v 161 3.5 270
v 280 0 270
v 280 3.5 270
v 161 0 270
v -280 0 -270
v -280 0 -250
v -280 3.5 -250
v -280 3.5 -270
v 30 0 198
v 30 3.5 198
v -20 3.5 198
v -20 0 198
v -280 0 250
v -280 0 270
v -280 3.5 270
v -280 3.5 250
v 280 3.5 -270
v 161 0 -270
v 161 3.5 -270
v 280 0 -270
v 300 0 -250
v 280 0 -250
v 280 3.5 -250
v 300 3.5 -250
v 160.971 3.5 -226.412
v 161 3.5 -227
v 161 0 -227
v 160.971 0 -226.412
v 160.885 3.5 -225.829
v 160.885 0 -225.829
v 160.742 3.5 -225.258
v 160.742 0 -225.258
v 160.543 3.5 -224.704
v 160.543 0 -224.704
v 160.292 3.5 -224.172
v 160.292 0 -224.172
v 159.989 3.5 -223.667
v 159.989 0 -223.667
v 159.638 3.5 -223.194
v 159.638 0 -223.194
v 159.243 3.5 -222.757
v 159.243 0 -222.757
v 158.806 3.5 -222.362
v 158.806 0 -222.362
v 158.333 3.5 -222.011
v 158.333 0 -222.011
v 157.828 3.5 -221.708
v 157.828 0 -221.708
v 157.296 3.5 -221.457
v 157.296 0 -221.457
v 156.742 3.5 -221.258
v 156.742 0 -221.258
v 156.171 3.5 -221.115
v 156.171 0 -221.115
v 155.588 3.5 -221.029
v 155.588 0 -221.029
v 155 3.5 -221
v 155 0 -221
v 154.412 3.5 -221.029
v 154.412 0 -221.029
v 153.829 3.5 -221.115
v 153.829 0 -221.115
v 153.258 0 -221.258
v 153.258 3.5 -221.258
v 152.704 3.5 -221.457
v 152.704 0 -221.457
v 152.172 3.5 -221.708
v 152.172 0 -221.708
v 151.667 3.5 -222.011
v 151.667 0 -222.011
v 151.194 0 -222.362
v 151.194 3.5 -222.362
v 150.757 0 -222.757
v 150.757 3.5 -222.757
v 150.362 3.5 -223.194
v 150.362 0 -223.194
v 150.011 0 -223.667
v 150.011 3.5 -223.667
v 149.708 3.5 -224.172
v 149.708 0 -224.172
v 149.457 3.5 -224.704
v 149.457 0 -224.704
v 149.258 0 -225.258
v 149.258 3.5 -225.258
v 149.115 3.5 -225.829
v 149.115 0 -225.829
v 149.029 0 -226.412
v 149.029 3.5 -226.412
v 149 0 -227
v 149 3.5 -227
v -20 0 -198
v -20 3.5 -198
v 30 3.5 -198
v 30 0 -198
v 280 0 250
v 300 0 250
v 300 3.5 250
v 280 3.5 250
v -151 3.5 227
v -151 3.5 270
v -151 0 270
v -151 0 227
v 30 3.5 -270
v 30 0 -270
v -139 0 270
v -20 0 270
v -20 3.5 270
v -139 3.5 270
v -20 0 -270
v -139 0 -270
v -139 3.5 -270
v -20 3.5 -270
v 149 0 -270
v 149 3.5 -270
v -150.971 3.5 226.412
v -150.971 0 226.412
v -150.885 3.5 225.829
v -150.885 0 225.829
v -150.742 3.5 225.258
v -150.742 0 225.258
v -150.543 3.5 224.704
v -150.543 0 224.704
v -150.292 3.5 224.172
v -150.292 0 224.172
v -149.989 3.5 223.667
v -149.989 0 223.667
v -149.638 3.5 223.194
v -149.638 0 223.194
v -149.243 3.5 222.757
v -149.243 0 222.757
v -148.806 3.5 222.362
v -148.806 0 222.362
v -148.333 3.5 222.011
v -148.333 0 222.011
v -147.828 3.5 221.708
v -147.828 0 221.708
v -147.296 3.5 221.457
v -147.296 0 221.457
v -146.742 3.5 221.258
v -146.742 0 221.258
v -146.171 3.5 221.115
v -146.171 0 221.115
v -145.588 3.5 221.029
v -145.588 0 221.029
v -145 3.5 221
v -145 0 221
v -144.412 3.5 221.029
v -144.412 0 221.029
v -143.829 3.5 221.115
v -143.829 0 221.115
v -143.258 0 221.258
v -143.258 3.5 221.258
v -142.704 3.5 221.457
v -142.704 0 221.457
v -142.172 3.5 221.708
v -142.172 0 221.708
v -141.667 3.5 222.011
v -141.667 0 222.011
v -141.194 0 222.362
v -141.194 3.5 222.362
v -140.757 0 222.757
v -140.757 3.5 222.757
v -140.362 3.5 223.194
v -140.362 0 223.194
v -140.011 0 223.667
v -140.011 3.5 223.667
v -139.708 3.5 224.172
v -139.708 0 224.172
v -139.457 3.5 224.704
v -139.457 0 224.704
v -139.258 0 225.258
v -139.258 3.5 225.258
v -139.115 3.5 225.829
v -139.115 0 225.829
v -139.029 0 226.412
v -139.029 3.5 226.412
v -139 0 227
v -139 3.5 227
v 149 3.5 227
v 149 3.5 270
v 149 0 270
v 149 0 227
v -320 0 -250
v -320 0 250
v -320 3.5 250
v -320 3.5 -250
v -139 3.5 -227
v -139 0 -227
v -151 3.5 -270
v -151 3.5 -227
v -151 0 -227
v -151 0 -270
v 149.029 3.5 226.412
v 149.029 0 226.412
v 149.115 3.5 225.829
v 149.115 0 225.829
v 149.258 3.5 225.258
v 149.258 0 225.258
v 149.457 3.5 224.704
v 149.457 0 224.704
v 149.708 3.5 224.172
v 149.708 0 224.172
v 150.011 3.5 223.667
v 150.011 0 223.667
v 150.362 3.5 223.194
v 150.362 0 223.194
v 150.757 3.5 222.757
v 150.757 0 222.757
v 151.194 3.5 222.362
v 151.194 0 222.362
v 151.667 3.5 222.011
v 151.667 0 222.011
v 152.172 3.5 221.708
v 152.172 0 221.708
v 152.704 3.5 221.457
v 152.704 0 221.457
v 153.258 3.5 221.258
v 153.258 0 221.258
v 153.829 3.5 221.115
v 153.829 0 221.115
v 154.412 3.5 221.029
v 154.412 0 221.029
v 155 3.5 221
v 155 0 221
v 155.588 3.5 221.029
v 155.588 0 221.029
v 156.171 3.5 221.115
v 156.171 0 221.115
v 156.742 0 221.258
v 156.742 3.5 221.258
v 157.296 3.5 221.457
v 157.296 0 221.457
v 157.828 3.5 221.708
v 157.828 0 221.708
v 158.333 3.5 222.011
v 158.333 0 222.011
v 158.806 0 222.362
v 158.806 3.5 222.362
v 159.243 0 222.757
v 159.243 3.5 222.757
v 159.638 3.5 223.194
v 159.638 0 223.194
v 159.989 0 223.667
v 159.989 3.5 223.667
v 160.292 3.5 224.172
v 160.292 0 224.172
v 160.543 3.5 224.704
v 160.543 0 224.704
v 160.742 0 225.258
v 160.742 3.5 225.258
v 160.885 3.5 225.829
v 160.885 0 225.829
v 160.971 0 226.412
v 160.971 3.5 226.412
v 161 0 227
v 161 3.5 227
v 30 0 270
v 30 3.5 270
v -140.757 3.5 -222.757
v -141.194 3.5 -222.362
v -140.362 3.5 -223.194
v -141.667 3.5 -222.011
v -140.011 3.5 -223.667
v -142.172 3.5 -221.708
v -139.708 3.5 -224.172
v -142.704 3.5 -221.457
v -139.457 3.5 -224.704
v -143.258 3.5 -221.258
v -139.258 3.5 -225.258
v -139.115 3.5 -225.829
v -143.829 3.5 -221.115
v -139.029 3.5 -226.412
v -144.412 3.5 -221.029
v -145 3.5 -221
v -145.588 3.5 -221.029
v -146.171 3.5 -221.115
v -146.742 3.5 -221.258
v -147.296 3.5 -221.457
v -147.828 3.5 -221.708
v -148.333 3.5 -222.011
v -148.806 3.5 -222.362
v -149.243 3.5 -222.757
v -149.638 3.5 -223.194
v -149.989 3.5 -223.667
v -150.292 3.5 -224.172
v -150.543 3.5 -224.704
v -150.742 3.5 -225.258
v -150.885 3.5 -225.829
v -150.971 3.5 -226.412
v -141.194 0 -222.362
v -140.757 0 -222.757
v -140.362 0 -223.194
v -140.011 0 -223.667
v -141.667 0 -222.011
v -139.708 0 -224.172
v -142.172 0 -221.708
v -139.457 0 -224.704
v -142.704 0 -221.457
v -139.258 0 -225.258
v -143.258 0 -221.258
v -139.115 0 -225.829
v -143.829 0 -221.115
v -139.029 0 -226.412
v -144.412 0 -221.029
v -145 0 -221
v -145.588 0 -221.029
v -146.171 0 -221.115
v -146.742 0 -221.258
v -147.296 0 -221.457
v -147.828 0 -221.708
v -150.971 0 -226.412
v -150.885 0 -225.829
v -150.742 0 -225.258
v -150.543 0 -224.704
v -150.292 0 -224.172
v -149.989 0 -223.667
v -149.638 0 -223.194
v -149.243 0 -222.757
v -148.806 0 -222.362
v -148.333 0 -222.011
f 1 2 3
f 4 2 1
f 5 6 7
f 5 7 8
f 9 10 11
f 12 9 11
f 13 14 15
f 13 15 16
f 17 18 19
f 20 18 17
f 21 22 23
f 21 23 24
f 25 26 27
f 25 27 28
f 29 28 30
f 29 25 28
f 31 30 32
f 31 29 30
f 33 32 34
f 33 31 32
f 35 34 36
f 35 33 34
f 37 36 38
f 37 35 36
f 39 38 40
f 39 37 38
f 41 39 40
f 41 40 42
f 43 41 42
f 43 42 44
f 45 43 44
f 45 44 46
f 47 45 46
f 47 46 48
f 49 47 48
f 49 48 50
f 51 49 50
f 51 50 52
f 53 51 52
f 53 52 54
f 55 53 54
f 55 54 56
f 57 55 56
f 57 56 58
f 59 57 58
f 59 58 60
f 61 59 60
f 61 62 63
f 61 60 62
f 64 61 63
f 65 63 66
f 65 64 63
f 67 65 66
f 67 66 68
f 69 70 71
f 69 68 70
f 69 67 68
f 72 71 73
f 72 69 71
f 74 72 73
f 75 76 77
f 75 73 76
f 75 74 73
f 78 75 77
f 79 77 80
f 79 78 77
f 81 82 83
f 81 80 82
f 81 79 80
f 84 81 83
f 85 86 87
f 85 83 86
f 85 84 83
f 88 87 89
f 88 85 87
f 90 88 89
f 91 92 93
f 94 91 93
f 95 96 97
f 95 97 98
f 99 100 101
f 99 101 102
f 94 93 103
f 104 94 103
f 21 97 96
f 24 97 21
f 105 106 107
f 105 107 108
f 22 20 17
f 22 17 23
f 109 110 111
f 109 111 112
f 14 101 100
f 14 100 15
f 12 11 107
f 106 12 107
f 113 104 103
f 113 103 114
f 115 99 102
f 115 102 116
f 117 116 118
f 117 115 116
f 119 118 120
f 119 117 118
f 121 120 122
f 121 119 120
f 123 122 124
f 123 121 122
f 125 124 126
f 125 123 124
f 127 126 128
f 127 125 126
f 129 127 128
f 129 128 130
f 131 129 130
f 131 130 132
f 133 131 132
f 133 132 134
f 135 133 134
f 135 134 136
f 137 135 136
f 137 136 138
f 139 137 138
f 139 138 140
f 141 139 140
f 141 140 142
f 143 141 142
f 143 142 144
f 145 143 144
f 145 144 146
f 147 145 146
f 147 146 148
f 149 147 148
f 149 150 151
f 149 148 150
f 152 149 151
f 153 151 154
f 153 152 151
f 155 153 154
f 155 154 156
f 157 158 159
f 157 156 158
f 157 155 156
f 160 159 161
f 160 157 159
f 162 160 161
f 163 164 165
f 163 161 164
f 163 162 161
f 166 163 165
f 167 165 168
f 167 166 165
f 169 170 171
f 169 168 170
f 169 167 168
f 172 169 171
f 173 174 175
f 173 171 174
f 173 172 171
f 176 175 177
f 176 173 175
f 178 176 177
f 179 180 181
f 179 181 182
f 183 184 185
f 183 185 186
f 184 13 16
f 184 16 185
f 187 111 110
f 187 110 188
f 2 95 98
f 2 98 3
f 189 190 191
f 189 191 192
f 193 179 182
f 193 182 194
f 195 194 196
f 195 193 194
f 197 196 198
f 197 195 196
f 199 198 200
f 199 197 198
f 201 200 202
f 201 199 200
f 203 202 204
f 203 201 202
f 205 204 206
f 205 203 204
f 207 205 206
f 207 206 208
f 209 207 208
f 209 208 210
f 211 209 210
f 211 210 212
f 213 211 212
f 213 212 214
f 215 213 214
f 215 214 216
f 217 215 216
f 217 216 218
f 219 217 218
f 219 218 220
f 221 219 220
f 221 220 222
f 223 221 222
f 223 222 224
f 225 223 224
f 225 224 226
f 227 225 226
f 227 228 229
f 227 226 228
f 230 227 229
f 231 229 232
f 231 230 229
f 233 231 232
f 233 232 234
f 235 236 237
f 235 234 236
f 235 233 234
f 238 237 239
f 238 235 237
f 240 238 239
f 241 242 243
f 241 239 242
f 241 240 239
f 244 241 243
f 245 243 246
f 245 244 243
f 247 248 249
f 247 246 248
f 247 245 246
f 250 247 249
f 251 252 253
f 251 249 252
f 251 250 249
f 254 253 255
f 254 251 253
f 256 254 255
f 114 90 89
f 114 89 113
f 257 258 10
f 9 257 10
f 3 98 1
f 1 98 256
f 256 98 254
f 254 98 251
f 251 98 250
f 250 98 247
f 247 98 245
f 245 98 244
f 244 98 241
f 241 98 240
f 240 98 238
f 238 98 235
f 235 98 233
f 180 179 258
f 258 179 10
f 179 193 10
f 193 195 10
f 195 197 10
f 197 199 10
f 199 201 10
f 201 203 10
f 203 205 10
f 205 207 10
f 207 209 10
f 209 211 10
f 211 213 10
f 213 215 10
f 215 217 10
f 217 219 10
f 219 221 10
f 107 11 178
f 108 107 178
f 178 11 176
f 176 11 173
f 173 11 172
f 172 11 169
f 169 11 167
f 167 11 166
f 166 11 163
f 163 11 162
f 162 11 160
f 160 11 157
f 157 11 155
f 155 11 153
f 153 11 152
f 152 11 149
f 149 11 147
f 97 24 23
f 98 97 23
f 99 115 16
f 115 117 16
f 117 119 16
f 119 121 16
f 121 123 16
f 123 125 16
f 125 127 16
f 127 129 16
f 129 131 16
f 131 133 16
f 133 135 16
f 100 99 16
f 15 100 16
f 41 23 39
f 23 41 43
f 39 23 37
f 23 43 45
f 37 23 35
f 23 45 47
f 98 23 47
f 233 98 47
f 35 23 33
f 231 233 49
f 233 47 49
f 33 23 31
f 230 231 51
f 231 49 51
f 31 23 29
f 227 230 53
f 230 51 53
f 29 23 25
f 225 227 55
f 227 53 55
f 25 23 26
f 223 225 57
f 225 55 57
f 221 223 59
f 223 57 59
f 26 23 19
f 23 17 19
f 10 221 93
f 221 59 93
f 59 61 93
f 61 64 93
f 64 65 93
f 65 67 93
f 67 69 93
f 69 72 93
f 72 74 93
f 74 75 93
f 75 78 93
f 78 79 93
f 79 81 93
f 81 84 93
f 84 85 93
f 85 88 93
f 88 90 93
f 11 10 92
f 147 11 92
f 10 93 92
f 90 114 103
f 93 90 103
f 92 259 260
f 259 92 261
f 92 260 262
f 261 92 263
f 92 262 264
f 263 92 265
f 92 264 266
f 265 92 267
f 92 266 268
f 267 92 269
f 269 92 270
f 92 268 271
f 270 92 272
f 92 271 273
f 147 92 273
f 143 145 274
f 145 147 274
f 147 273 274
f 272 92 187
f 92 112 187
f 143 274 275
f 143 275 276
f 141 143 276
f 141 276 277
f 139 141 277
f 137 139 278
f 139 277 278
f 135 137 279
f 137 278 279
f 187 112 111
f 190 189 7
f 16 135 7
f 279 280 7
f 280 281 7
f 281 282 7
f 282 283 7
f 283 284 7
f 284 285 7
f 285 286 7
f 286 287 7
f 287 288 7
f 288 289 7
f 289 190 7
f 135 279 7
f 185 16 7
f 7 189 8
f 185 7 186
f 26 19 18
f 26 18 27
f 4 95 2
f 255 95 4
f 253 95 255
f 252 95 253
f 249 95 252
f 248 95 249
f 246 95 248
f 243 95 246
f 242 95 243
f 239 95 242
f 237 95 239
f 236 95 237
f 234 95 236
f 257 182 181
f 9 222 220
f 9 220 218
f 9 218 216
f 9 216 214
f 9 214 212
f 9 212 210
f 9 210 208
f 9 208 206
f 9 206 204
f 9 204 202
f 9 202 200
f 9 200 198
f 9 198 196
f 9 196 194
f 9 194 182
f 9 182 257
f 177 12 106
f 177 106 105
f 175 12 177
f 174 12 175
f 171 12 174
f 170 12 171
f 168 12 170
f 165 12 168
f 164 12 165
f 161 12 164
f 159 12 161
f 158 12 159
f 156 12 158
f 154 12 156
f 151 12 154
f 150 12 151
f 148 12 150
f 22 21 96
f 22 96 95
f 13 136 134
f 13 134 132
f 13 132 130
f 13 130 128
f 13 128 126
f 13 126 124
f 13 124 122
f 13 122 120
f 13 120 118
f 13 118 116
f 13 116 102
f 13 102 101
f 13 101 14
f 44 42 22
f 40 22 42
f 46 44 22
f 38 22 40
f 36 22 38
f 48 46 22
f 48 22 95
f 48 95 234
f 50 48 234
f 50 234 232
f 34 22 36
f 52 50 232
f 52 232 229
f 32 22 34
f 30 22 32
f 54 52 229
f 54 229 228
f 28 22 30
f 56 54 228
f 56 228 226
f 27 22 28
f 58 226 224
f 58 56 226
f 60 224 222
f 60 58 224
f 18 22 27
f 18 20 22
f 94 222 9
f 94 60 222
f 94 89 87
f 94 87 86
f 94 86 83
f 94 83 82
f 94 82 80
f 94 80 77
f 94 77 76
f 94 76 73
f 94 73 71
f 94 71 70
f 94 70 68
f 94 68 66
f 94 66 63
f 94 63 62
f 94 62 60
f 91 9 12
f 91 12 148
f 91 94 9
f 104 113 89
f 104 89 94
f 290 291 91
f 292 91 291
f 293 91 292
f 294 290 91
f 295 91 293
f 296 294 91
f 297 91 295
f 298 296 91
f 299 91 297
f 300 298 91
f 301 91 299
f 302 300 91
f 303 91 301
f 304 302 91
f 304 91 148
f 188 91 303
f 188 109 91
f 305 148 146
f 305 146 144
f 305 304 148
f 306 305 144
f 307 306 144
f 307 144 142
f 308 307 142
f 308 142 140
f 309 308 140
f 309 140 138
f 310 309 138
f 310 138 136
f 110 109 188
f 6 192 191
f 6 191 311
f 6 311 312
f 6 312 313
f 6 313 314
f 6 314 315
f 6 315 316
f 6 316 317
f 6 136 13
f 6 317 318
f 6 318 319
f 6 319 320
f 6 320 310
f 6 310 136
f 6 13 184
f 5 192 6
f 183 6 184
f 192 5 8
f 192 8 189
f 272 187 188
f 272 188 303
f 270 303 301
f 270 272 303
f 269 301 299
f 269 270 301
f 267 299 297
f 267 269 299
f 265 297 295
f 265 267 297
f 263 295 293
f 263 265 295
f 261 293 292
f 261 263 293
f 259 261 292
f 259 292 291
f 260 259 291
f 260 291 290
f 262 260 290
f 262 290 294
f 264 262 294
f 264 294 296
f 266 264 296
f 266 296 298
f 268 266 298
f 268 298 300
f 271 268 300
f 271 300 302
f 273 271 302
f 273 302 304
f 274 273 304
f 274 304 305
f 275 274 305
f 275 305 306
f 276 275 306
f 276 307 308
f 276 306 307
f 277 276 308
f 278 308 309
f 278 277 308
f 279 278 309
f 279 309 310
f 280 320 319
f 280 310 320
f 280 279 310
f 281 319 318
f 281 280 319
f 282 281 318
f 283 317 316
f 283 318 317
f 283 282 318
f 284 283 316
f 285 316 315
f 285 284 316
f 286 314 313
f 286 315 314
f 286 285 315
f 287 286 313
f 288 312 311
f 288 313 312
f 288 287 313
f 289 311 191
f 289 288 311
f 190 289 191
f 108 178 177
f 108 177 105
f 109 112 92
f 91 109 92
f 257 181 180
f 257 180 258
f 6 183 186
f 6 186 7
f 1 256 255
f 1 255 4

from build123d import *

# Parameters (mm, degrees)
BOSS_EXTRUDE1_DEPTH = 3.5
SKETCH2_W           = 20
SKETCH2_H           = 40
CUT_EXTRUDE1_DEPTH  = 10
CUT_EXTRUDE2_DEPTH  = 10
SKETCH4_W           = 20
SKETCH4_H           = 420
CUT_EXTRUDE3_DEPTH  = 4.5


with BuildPart() as part:
    # Sketch1 → Boss-Extrude1 (new body)
    with BuildSketch(Plane(origin=(0, 0, 0), x_dir=(1, 0, 0), z_dir=(0, 1, 0))):
        Polygon((-280, 270), (280, 270), (280, 250), (320, 250), (320, -250), (280, -250), (280, -270), (-280, -270), (-280, -250), (-320, -250), (-320, 250), (-280, 250), align=None)
    extrude(amount=BOSS_EXTRUDE1_DEPTH)

    # Sketch2 → Cut-Extrude1 (cut)
    with BuildSketch(Plane(origin=(0, 3.5, 0), x_dir=(1, 0, 0), z_dir=(0, 1, 0))):
        Polygon((30, -250), (30, -198), (-20, -198), (-20, -250), (-20, -270), (30, -270), align=None)
        Polygon((-20, 198), (30, 198), (30, 250), (30, 270), (-20, 270), (-20, 250), align=None)
        with Locations((310, 230)):
            Rectangle(SKETCH2_W, SKETCH2_H)
        with Locations((310, -230)):
            Rectangle(SKETCH2_W, SKETCH2_H)
    extrude(amount=-CUT_EXTRUDE1_DEPTH, mode=Mode.SUBTRACT)

    # Sketch3 → Cut-Extrude2 (cut)
    with BuildSketch(Plane(origin=(0, 3.5, 0), x_dir=(1, 0, 0), z_dir=(0, 1, 0))):
        with BuildLine():
            Line((149, 227), (149, 270))
            Line((149, 270), (161, 270))
            Line((161, 270), (161, 227))
            ThreePointArc((161, 227), (155, 221), (149, 227))
        make_face()
        with BuildLine():
            Line((161, -227), (161, -270))
            Line((161, -270), (149, -270))
            Line((149, -270), (149, -227))
            ThreePointArc((149, -227), (155, -221), (161, -227))
        make_face()
        with BuildLine():
            Line((-139, -227), (-139, -270))
            Line((-139, -270), (-151, -270))
            Line((-151, -270), (-151, -227))
            ThreePointArc((-151, -227), (-145, -221), (-139, -227))
        make_face()
        with BuildLine():
            Line((-151, 227), (-151, 270))
            Line((-151, 270), (-139, 270))
            Line((-139, 270), (-139, 227))
            ThreePointArc((-139, 227), (-145, 221), (-151, 227))
        make_face()
    extrude(amount=-CUT_EXTRUDE2_DEPTH, mode=Mode.SUBTRACT)

    # Sketch4 → Cut-Extrude3 (cut, through all)
    with BuildSketch(Plane(origin=(0, 3.5, 0), x_dir=(1, 0, 0), z_dir=(0, 1, 0))):
        with Locations((310, 0)):
            Rectangle(SKETCH4_W, SKETCH4_H)
    extrude(amount=-CUT_EXTRUDE3_DEPTH, mode=Mode.SUBTRACT)


solid = part.part
